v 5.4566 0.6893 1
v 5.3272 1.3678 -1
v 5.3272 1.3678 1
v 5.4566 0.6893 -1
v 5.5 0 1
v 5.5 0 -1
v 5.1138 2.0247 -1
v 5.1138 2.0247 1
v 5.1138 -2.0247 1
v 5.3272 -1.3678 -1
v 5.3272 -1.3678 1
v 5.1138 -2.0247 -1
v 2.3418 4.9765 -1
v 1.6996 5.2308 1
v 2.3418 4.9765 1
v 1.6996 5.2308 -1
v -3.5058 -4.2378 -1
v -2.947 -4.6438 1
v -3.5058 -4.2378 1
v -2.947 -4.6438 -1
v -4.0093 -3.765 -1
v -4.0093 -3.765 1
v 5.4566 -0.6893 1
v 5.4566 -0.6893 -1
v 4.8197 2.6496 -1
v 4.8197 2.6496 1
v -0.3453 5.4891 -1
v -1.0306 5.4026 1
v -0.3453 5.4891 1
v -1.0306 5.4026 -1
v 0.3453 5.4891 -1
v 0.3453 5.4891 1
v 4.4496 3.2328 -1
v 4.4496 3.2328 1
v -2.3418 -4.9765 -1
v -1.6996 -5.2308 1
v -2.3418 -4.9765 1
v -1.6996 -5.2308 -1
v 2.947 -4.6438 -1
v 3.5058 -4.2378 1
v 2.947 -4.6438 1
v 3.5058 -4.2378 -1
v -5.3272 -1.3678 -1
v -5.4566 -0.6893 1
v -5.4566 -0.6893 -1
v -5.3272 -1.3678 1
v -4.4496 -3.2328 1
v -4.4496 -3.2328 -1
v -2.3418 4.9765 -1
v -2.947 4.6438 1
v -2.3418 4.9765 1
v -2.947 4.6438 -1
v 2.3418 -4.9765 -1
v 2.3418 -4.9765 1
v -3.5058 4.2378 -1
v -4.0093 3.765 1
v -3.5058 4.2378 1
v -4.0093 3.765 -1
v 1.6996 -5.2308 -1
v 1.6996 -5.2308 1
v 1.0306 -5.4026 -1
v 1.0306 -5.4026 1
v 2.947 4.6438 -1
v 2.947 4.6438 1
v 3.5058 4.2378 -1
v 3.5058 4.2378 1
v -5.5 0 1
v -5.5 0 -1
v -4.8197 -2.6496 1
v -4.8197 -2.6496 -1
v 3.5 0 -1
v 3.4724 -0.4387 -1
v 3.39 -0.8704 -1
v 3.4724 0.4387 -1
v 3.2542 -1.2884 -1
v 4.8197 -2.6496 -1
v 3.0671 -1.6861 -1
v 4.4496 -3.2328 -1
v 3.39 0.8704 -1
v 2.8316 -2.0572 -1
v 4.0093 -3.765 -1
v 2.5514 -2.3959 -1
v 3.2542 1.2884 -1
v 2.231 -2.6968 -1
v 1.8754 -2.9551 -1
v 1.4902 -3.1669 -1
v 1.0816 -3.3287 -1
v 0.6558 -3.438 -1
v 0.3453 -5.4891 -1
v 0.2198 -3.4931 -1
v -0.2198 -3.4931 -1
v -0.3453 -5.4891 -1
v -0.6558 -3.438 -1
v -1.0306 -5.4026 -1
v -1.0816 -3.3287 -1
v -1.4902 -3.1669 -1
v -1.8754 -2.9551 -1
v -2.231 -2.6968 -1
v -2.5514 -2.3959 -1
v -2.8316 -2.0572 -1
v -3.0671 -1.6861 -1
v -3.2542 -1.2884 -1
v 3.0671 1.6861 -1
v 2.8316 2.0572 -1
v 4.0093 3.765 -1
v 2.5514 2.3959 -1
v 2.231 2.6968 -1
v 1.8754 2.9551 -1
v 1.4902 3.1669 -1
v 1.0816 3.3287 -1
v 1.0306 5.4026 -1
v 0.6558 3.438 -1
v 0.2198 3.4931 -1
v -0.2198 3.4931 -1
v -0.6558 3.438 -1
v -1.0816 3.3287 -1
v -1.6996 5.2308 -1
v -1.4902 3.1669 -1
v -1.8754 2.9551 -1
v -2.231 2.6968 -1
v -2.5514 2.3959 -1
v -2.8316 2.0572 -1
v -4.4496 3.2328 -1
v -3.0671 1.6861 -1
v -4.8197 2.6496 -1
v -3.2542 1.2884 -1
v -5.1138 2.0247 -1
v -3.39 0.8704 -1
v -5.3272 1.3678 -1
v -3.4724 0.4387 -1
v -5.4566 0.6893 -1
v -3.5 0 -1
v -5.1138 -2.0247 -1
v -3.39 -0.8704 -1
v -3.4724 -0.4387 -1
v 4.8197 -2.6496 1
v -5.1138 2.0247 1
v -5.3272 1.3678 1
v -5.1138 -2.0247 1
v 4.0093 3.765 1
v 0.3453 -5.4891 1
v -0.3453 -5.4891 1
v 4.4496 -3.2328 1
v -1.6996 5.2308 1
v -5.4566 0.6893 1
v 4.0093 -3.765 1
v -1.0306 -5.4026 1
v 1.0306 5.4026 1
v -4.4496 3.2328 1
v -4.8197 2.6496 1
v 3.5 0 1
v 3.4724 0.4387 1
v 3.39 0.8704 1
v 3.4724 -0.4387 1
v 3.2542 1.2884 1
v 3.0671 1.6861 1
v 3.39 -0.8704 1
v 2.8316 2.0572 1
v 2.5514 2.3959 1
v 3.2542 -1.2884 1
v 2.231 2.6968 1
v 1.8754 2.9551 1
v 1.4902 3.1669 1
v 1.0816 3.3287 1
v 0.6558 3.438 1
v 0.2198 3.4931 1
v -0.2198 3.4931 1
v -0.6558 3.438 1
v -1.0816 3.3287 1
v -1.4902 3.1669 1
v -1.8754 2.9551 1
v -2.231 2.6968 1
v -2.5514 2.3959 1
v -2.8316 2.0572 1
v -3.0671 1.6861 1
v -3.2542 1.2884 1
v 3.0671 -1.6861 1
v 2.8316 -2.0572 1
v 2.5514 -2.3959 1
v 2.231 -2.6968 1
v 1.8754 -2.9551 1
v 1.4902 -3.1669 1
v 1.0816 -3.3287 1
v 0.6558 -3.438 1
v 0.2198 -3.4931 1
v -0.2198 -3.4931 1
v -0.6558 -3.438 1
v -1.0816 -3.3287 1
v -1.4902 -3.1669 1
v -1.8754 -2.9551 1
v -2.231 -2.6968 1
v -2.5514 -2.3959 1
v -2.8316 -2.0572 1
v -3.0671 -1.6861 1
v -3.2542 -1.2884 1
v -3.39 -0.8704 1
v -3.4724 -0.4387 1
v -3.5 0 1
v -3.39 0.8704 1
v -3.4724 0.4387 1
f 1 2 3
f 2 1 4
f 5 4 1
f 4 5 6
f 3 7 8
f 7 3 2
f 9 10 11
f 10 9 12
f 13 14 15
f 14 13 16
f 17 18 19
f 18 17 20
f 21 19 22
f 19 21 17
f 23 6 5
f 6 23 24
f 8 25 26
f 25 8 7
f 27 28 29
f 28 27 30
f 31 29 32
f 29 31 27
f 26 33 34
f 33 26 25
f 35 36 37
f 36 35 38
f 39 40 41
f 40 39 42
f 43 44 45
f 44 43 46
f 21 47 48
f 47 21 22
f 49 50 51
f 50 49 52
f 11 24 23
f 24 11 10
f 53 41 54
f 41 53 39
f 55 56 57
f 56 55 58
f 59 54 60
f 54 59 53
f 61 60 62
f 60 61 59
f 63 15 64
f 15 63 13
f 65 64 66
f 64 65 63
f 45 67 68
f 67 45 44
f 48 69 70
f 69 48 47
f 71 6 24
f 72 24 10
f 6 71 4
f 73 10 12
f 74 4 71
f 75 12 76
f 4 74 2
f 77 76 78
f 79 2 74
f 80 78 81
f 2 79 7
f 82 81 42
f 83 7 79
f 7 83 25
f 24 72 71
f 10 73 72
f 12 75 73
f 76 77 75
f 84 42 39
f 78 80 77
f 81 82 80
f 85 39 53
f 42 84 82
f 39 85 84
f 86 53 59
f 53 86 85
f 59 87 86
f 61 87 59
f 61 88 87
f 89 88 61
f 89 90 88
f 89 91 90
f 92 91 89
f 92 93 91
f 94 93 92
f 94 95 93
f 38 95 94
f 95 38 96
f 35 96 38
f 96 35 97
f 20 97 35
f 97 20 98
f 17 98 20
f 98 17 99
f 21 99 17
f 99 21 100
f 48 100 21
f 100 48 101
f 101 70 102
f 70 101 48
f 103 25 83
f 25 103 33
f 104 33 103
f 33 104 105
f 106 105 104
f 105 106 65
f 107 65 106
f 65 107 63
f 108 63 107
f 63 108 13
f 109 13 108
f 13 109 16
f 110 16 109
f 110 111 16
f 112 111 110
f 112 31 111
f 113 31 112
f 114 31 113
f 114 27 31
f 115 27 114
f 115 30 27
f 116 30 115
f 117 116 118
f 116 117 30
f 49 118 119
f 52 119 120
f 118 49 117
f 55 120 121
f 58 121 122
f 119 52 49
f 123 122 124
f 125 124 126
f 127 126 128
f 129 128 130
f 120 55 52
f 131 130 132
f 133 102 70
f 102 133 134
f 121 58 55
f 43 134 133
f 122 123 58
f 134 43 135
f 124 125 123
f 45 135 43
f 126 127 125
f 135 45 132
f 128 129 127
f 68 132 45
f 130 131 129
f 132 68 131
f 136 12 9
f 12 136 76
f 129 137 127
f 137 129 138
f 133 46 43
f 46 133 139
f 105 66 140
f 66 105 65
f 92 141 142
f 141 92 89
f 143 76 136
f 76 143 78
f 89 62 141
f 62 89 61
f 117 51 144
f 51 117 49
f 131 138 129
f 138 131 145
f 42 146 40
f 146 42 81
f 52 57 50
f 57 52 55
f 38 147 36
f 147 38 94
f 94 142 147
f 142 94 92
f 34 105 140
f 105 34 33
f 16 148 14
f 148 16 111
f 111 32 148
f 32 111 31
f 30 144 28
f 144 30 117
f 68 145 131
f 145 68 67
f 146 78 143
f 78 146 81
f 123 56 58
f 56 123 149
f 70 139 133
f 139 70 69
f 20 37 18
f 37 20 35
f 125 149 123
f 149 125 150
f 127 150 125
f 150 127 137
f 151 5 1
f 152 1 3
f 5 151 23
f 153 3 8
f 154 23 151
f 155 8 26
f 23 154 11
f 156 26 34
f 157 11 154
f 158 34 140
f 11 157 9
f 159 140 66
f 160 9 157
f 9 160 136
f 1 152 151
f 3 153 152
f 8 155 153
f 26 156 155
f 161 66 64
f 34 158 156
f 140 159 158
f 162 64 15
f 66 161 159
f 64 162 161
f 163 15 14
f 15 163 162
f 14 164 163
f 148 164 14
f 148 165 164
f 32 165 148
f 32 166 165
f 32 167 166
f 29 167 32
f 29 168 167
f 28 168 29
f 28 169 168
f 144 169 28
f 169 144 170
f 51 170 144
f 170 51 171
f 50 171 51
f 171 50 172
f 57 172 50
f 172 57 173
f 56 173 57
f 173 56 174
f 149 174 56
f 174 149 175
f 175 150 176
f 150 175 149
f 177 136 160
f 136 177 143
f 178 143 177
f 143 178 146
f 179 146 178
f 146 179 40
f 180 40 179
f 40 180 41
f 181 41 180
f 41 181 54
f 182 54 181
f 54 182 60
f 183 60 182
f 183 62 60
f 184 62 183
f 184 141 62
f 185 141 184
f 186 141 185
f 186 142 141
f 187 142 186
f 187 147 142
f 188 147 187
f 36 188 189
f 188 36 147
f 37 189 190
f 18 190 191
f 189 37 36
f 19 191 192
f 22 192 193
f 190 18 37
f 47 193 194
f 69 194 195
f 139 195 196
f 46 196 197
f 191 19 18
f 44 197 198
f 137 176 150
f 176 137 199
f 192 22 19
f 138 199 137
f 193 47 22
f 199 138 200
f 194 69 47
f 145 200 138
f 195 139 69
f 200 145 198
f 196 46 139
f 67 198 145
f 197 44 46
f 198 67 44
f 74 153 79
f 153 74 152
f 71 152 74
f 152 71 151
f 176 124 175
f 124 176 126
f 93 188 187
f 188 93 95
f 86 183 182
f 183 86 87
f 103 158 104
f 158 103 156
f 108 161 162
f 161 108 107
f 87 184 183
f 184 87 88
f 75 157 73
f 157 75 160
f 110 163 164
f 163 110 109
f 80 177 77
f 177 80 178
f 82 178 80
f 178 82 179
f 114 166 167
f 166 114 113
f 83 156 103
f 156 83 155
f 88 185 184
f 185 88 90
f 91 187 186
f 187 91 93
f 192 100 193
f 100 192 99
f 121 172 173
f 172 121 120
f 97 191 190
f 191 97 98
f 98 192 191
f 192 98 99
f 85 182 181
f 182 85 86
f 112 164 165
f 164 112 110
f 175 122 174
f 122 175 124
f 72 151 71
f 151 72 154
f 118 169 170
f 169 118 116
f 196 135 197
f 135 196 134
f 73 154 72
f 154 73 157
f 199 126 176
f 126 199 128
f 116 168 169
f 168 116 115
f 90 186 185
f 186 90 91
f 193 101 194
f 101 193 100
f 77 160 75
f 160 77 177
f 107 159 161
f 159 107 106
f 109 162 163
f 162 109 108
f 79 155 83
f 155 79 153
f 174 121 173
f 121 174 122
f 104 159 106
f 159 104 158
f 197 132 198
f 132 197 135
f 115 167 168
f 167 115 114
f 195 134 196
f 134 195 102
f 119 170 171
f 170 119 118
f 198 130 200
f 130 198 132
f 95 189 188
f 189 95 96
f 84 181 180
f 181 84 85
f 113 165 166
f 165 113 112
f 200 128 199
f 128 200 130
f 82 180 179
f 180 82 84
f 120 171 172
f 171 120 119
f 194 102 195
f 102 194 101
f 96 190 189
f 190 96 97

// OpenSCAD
$fn = 50;


difference() {
	union() {
		translate(v = [0, 0, -1.0000000000]) {
			cylinder(h = 2, r = 5.5000000000);
		}
	}
	union() {
		translate(v = [0, 0, -100.0000000000]) {
			cylinder(h = 200, r = 3.5000000000);
		}
	}
}
